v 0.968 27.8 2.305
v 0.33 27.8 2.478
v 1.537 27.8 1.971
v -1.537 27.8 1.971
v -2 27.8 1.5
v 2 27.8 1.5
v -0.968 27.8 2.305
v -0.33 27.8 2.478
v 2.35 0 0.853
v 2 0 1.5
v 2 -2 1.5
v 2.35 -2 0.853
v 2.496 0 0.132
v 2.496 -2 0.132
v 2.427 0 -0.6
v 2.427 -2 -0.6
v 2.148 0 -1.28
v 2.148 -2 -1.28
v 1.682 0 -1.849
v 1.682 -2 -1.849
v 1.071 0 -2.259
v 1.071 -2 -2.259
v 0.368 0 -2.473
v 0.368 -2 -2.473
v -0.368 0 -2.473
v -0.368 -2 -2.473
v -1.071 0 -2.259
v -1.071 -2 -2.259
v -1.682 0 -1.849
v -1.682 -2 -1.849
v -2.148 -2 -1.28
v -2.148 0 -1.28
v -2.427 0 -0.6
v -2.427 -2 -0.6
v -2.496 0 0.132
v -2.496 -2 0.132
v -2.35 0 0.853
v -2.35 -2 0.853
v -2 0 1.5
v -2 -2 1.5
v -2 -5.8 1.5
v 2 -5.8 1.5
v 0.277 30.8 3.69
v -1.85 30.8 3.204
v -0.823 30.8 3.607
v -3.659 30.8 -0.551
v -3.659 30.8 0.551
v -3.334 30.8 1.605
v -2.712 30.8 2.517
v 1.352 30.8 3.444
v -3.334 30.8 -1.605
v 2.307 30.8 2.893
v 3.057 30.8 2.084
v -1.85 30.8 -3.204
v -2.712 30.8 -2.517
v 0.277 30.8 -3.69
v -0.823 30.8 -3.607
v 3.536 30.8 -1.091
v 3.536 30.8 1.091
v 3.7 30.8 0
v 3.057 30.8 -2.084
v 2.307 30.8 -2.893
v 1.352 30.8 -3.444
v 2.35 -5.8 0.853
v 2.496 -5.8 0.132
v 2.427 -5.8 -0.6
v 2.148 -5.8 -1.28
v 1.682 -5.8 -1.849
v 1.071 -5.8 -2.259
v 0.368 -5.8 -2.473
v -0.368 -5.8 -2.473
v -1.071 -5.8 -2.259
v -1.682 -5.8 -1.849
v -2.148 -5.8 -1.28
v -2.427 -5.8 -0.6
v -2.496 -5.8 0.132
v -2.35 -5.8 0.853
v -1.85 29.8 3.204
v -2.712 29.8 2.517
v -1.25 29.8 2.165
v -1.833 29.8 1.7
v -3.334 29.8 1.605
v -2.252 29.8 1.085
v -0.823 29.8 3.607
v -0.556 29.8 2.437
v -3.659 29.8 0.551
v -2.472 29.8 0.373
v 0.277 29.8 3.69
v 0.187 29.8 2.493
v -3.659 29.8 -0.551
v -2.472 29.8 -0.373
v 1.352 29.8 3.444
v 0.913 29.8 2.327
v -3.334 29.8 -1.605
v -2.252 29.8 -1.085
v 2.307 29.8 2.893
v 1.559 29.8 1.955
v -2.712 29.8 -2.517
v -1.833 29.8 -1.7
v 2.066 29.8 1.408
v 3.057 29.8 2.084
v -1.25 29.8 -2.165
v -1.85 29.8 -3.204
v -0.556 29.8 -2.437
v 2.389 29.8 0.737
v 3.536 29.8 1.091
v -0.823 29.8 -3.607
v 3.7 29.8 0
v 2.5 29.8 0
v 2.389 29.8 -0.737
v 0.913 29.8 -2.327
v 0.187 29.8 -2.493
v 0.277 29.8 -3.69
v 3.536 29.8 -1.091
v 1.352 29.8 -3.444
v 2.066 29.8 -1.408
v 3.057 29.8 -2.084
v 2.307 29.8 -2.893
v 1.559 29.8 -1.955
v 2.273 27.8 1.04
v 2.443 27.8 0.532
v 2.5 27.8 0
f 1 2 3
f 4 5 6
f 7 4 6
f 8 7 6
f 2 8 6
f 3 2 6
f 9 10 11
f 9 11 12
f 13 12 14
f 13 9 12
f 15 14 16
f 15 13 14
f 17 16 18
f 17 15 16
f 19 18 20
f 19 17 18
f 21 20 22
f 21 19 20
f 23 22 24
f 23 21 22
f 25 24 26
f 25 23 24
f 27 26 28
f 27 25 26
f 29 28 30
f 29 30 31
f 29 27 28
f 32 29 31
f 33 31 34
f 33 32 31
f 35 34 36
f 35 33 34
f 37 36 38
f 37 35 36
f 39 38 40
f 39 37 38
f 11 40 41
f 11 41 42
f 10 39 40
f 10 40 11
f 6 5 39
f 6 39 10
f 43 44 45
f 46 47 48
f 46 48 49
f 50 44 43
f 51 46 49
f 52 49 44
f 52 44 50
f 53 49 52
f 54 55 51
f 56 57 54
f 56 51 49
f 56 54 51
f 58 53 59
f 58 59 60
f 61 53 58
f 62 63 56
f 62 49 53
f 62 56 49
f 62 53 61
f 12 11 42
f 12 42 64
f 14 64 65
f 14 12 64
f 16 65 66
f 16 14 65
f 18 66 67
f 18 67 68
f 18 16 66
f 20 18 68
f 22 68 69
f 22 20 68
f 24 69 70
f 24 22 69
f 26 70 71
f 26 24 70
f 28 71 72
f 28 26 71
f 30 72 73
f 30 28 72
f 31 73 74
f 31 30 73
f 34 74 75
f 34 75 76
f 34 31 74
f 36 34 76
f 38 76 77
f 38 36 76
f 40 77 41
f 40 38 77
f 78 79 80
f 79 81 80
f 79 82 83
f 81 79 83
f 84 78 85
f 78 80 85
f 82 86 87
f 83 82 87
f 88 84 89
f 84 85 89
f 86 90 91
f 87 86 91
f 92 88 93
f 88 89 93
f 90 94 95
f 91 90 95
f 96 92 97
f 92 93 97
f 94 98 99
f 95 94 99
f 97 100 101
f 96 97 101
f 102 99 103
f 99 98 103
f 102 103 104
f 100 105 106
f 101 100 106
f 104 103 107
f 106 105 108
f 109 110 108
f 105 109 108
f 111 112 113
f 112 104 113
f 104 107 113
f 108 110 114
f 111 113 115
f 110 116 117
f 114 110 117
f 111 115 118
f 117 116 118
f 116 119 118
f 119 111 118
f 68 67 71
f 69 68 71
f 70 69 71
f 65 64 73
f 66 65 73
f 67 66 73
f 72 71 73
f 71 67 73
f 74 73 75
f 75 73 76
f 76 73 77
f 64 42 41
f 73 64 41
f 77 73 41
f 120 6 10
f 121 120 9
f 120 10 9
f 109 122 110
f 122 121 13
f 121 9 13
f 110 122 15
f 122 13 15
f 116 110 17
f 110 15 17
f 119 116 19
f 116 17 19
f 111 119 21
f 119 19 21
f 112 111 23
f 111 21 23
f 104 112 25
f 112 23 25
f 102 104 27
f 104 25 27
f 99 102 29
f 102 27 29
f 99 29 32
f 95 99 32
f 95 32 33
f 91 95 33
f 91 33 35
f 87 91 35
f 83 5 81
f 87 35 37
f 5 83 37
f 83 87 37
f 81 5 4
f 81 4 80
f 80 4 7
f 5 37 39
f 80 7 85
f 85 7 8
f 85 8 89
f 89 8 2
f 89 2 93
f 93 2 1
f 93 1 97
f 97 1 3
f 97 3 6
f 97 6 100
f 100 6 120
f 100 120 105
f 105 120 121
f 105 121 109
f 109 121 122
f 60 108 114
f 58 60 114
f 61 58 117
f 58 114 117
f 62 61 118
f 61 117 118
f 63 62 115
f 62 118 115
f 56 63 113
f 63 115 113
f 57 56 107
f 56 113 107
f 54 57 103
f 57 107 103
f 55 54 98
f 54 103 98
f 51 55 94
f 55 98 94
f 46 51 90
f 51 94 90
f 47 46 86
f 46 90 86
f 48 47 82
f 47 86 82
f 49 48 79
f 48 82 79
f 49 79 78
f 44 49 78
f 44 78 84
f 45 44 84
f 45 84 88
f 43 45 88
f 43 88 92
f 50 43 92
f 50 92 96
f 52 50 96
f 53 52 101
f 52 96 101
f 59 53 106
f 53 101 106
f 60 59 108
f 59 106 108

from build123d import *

# Parameters (mm, degrees)
EXTRUDE_1_DEPTH = 27.8
SKETCH_2_R      = 2.5
EXTRUDE_2_DEPTH = 2
SKETCH_3_R      = 3.7
EXTRUDE_3_DEPTH = 1
EXTRUDE_4_DEPTH = 2
EXTRUDE_5_DEPTH = 3.8


with BuildPart() as part:
    # 草图1 → 凸台-拉伸1 (new body)
    with BuildSketch(Plane(origin=(0, 0, 0), x_dir=(1, 0, 0), z_dir=(0, 1, 0))):
        with BuildLine():
            Line((-2, -1.5), (2, -1.5))
            ThreePointArc((2, -1.5), (0, 2.5), (-2, -1.5))
        make_face()
    extrude(amount=EXTRUDE_1_DEPTH)

    # 草图2 → 凸台-拉伸2 (add)
    with BuildSketch(Plane(origin=(0, 27.8, 0), x_dir=(1, 0, 0), z_dir=(0, 1, 0))):
        Circle(SKETCH_2_R)
    extrude(amount=EXTRUDE_2_DEPTH)

    # 草图3 → 凸台-拉伸3 (add)
    with BuildSketch(Plane(origin=(0, 29.8, 0), x_dir=(1, 0, 0), z_dir=(0, 1, 0))):
        Circle(SKETCH_3_R)
    extrude(amount=EXTRUDE_3_DEPTH)

    # 草图4 → 凸台-拉伸4 (add)
    with BuildSketch(Plane.XZ):
        with BuildLine():
            Line((-2, 1.5), (2, 1.5))
            ThreePointArc((2, 1.5), (0, -2.5), (-2, 1.5))
        make_face()
    extrude(amount=EXTRUDE_4_DEPTH)

    # 草图5 → 凸台-拉伸5 (add)
    with BuildSketch(Plane.XZ.offset(2)):
        with BuildLine():
            Line((-2, 1.5), (2, 1.5))
            ThreePointArc((2, 1.5), (0, -2.5), (-2, 1.5))
        make_face()
    extrude(amount=EXTRUDE_5_DEPTH)


solid = part.part
